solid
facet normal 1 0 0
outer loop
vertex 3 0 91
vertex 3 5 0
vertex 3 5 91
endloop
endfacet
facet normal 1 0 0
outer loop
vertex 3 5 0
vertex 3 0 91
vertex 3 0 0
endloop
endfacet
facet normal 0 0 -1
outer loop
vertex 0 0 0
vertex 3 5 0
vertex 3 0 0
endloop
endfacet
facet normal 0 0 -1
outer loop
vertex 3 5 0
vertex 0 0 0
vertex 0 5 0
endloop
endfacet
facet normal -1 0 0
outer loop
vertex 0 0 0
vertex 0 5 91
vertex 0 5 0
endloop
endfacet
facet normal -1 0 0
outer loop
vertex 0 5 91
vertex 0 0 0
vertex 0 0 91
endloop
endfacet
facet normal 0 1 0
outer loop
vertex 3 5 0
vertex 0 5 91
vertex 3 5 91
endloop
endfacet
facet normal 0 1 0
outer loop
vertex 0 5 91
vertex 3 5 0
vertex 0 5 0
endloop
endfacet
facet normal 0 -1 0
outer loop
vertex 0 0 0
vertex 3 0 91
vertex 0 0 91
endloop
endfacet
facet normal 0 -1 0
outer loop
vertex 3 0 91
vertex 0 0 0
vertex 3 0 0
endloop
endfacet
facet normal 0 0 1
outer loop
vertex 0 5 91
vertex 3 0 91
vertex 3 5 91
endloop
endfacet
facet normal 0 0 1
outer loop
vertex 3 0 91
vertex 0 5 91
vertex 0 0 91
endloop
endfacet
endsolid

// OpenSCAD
translate([1.5, 2.5, 3.5]) color([0.9834841816788549, 0.427290207198605, 0.49195852420878716]) cube([3, 5, 7], center=true);
translate([1.5, 2.5, 10.5]) color([0.7297831417632067, 0.7955834433152874, 0.43927203819181504]) cube([3, 5, 7], center=true);
translate([1.5, 2.5, 17.5]) color([0.2042687131951023, 0.709997013582239, 0.9058221085991531]) cube([3, 5, 7], center=true);
translate([1.5, 2.5, 24.5]) color([0.03327924187503195, 0.6331757983912308, 0.8710093735661795]) cube([3, 5, 7], center=true);
translate([1.5, 2.5, 31.5]) color([0.3636101637556439, 0.7431628081058981, 0.6774926049513658]) cube([3, 5, 7], center=true);
translate([1.5, 2.5, 38.5]) color([0.23306417175218364, 0.2975271762349214, 0.0866296567389645]) cube([3, 5, 7], center=true);
translate([1.5, 2.5, 45.5]) color([0.8688435220131177, 0.7514921149941085, 0.7714305883456576]) cube([3, 5, 7], center=true);
translate([1.5, 2.5, 52.5]) color([0.8829516943772963, 0.4114323292545551, 0.05394001775890156]) cube([3, 5, 7], center=true);
translate([1.5, 2.5, 59.5]) color([0.696805048854085, 0.6656296547984208, 0.6485122289860075]) cube([3, 5, 7], center=true);
translate([1.5, 2.5, 66.5]) color([0.5471816206705559, 0.7344166333532061, 0.4306045068871984]) cube([3, 5, 7], center=true);
translate([1.5, 2.5, 73.5]) color([0.45460236437769275, 0.25475221651879554, 0.47565246533915095]) cube([3, 5, 7], center=true);
translate([1.5, 2.5, 78.0]) color([0.3371942584654095, 0.04223511400675217, 0.05255331220371673]) cube([3, 5, 2], center=true);
translate([1.5, 2.5, 80.0]) color([0.34980223330761895, 0.2898096938030986, 0.007130057665757694]) cube([3, 5, 2], center=true);
translate([1.5, 2.5, 82.0]) color([0.06369015415518986, 0.42774457246440645, 0.22216650821772055]) cube([3, 5, 2], center=true);
translate([1.5, 2.5, 84.0]) color([0.6086379170158094, 0.557768500755667, 0.22097295115667703]) cube([3, 5, 2], center=true);
translate([1.5, 2.5, 86.0]) color([0.19284823789822858, 0.6083188139076446, 0.606354511401297]) cube([3, 5, 2], center=true);
translate([1.5, 2.5, 88.0]) color([0.08562053587131313, 0.31903016062772993, 0.53590115499306]) cube([3, 5, 2], center=true);
translate([1.5, 2.5, 90.0]) color([0.8934753784920533, 0.25549985489866966, 0.5219903070058861]) cube([3, 5, 2], center=true);
